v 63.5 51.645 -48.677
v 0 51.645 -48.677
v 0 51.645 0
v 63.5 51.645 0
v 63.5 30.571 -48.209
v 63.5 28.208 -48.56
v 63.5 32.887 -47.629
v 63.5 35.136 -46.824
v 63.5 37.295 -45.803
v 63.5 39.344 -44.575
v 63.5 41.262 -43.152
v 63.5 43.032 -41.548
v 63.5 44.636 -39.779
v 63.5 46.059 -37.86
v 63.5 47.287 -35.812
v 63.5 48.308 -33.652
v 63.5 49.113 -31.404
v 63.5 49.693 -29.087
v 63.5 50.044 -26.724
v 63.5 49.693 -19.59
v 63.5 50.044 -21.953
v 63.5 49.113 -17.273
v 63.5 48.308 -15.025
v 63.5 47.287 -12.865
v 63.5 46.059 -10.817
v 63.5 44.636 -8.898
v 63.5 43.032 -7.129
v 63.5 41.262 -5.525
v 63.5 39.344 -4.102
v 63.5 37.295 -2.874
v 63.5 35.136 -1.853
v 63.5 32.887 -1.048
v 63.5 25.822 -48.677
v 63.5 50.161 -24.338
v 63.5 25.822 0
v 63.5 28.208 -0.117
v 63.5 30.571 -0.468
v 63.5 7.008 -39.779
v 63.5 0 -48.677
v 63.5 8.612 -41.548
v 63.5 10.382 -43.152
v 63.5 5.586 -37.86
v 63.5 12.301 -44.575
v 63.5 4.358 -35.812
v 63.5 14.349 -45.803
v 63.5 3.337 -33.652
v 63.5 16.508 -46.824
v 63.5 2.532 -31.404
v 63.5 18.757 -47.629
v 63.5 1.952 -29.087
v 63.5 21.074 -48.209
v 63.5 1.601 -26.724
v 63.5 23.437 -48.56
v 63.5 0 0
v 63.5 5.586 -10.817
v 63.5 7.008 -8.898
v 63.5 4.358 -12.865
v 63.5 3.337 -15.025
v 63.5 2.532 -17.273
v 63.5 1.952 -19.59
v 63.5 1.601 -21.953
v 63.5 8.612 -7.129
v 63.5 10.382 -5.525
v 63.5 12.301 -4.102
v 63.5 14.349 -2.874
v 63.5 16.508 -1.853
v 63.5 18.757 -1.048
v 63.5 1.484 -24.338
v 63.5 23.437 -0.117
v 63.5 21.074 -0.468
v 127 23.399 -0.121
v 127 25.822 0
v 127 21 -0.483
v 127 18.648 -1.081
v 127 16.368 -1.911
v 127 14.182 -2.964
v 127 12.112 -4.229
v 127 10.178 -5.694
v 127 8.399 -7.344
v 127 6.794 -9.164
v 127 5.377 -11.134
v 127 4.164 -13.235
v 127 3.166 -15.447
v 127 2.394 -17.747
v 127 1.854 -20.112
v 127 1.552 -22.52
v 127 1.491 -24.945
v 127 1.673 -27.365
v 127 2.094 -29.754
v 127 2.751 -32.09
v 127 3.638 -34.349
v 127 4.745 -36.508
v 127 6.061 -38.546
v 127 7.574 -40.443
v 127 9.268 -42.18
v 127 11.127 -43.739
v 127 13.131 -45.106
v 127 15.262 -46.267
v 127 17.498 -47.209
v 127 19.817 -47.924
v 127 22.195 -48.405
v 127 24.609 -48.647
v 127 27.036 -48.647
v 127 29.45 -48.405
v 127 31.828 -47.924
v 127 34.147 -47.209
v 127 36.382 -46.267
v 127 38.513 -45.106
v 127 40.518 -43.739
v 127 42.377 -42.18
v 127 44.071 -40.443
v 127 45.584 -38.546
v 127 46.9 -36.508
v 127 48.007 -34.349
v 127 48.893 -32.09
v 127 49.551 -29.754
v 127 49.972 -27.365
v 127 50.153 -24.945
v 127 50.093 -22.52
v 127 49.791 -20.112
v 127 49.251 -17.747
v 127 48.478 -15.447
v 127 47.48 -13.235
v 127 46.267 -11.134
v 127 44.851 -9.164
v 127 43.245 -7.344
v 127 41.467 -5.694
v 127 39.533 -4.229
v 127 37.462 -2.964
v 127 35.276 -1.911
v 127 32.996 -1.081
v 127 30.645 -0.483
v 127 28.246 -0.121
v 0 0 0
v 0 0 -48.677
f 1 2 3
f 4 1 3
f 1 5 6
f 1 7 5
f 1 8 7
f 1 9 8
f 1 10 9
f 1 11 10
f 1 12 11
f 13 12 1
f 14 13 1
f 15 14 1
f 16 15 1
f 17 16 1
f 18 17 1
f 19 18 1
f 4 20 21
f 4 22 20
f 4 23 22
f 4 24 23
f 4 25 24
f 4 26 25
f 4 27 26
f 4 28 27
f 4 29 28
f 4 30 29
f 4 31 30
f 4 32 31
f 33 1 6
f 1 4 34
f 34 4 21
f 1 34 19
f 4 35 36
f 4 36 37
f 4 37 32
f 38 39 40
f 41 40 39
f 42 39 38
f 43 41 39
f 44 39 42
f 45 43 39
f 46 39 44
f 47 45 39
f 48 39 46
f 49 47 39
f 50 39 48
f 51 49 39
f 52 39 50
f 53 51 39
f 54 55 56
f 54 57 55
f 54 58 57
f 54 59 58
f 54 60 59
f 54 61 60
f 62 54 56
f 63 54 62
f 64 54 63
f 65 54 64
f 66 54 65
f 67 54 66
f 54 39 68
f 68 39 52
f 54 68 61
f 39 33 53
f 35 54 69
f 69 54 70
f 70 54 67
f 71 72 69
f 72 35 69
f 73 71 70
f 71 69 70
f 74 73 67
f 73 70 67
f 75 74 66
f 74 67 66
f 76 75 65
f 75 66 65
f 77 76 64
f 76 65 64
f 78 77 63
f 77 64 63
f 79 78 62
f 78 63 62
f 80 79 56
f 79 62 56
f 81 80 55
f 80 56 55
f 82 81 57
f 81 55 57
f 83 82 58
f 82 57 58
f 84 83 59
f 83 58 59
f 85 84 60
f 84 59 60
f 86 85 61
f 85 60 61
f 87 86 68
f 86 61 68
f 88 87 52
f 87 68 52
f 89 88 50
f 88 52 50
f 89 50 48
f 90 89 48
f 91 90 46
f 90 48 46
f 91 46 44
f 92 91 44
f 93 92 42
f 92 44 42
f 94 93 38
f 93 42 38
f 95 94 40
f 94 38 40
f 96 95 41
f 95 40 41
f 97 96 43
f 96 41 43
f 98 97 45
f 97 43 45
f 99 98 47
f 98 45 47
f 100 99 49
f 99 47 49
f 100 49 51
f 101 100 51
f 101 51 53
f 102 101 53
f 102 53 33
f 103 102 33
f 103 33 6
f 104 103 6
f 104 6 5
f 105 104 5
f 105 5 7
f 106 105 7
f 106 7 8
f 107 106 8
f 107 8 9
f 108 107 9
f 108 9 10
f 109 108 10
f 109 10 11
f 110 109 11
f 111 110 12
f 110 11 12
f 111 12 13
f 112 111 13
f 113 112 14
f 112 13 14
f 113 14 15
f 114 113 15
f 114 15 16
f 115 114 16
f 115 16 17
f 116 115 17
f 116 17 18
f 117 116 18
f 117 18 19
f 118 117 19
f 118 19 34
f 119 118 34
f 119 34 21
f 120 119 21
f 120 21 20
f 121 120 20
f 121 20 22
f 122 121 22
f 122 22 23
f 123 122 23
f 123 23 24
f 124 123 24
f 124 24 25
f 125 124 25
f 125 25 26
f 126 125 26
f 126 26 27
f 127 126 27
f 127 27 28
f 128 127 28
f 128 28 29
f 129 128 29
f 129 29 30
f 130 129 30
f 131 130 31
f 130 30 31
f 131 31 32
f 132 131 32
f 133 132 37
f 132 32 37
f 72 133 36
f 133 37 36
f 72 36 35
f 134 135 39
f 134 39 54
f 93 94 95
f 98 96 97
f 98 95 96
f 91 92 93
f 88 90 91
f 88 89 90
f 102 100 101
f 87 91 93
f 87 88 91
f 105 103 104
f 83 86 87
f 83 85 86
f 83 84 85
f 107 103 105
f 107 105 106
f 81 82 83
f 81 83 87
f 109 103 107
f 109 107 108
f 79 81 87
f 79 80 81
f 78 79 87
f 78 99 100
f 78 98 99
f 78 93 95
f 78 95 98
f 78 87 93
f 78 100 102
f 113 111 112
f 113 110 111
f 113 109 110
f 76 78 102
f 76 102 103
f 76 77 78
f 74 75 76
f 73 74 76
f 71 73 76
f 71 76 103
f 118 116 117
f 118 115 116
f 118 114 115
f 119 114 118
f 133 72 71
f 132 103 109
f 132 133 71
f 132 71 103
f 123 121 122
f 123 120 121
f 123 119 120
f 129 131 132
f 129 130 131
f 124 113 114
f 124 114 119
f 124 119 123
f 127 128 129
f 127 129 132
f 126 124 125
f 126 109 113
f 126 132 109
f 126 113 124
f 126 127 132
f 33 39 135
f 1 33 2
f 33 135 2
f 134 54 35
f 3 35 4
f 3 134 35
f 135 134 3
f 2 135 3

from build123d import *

# Parameters (mm, degrees)
F0_W     = 51.6446605325
F0_H     = 48.6768968403
F1_DEPTH = 63.5
F3_DEPTH = 63.5
F4_R     = 24.3384484202
F6_DEPTH = 25.399999693


# Not quite as in the source:
# - the program builds the solid bodies; features that only make, move or delete a surface that nothing else refers to are left out


with BuildPart() as f1:
    # F0 (on Right) → F1 (new body)
    with BuildSketch(Plane.YZ):
        with Locations((25.8223302662, -24.3384484202)):
            Rectangle(F0_W, F0_H)
    extrude(amount=F1_DEPTH)

    # F2 (on face) → F3 (join)
    with BuildSketch(Plane.YZ.offset(63.5)):
        with BuildLine():
            ThreePointArc((25.8223302662, -48.6768968403), (43.0322121877, -41.5483303416), (50.1607786864, -24.3384484202))
            ThreePointArc((50.1607786864, -24.3384484202), (43.0322121877, -7.1285664987), (25.8223302662, 0))
            ThreePointArc((25.8223302662, 0), (1.4838818461, -24.3384484202), (25.8223302662, -48.6768968403))
        make_face()
    extrude(amount=F3_DEPTH)

    # F4 (on face) + F5 (on face) → F6 (cut)
    with BuildSketch(Plane.YZ.offset(127)):
        with Locations((25.8223302662, -24.3384484202)):
            Circle(F4_R)
    with BuildSketch(Plane.YZ.offset(127)):
        with BuildLine():
            add(Edge.make_bspline(
                [(24.2070443928, -3.5950578749), (13.7185256549, -3.5950578749), (18.9627850239, -34.8861049861), (24.2070443928, -66.1771520972), (29.4513037618, -34.8861049861), (34.6955631307, -3.5950578749), (24.2070443928, -3.5950578749)],
                knots=[0, 0, 0, 2.0943951024, 2.0943951024, 4.1887902048, 4.1887902048, 6.2831853072, 6.2831853072, 6.2831853072], degree=2, weights=[1, 0.5, 1, 0.5, 1, 0.5, 1]))
        make_face()
    extrude(amount=F6_DEPTH, mode=Mode.SUBTRACT)


solid = f1.part
